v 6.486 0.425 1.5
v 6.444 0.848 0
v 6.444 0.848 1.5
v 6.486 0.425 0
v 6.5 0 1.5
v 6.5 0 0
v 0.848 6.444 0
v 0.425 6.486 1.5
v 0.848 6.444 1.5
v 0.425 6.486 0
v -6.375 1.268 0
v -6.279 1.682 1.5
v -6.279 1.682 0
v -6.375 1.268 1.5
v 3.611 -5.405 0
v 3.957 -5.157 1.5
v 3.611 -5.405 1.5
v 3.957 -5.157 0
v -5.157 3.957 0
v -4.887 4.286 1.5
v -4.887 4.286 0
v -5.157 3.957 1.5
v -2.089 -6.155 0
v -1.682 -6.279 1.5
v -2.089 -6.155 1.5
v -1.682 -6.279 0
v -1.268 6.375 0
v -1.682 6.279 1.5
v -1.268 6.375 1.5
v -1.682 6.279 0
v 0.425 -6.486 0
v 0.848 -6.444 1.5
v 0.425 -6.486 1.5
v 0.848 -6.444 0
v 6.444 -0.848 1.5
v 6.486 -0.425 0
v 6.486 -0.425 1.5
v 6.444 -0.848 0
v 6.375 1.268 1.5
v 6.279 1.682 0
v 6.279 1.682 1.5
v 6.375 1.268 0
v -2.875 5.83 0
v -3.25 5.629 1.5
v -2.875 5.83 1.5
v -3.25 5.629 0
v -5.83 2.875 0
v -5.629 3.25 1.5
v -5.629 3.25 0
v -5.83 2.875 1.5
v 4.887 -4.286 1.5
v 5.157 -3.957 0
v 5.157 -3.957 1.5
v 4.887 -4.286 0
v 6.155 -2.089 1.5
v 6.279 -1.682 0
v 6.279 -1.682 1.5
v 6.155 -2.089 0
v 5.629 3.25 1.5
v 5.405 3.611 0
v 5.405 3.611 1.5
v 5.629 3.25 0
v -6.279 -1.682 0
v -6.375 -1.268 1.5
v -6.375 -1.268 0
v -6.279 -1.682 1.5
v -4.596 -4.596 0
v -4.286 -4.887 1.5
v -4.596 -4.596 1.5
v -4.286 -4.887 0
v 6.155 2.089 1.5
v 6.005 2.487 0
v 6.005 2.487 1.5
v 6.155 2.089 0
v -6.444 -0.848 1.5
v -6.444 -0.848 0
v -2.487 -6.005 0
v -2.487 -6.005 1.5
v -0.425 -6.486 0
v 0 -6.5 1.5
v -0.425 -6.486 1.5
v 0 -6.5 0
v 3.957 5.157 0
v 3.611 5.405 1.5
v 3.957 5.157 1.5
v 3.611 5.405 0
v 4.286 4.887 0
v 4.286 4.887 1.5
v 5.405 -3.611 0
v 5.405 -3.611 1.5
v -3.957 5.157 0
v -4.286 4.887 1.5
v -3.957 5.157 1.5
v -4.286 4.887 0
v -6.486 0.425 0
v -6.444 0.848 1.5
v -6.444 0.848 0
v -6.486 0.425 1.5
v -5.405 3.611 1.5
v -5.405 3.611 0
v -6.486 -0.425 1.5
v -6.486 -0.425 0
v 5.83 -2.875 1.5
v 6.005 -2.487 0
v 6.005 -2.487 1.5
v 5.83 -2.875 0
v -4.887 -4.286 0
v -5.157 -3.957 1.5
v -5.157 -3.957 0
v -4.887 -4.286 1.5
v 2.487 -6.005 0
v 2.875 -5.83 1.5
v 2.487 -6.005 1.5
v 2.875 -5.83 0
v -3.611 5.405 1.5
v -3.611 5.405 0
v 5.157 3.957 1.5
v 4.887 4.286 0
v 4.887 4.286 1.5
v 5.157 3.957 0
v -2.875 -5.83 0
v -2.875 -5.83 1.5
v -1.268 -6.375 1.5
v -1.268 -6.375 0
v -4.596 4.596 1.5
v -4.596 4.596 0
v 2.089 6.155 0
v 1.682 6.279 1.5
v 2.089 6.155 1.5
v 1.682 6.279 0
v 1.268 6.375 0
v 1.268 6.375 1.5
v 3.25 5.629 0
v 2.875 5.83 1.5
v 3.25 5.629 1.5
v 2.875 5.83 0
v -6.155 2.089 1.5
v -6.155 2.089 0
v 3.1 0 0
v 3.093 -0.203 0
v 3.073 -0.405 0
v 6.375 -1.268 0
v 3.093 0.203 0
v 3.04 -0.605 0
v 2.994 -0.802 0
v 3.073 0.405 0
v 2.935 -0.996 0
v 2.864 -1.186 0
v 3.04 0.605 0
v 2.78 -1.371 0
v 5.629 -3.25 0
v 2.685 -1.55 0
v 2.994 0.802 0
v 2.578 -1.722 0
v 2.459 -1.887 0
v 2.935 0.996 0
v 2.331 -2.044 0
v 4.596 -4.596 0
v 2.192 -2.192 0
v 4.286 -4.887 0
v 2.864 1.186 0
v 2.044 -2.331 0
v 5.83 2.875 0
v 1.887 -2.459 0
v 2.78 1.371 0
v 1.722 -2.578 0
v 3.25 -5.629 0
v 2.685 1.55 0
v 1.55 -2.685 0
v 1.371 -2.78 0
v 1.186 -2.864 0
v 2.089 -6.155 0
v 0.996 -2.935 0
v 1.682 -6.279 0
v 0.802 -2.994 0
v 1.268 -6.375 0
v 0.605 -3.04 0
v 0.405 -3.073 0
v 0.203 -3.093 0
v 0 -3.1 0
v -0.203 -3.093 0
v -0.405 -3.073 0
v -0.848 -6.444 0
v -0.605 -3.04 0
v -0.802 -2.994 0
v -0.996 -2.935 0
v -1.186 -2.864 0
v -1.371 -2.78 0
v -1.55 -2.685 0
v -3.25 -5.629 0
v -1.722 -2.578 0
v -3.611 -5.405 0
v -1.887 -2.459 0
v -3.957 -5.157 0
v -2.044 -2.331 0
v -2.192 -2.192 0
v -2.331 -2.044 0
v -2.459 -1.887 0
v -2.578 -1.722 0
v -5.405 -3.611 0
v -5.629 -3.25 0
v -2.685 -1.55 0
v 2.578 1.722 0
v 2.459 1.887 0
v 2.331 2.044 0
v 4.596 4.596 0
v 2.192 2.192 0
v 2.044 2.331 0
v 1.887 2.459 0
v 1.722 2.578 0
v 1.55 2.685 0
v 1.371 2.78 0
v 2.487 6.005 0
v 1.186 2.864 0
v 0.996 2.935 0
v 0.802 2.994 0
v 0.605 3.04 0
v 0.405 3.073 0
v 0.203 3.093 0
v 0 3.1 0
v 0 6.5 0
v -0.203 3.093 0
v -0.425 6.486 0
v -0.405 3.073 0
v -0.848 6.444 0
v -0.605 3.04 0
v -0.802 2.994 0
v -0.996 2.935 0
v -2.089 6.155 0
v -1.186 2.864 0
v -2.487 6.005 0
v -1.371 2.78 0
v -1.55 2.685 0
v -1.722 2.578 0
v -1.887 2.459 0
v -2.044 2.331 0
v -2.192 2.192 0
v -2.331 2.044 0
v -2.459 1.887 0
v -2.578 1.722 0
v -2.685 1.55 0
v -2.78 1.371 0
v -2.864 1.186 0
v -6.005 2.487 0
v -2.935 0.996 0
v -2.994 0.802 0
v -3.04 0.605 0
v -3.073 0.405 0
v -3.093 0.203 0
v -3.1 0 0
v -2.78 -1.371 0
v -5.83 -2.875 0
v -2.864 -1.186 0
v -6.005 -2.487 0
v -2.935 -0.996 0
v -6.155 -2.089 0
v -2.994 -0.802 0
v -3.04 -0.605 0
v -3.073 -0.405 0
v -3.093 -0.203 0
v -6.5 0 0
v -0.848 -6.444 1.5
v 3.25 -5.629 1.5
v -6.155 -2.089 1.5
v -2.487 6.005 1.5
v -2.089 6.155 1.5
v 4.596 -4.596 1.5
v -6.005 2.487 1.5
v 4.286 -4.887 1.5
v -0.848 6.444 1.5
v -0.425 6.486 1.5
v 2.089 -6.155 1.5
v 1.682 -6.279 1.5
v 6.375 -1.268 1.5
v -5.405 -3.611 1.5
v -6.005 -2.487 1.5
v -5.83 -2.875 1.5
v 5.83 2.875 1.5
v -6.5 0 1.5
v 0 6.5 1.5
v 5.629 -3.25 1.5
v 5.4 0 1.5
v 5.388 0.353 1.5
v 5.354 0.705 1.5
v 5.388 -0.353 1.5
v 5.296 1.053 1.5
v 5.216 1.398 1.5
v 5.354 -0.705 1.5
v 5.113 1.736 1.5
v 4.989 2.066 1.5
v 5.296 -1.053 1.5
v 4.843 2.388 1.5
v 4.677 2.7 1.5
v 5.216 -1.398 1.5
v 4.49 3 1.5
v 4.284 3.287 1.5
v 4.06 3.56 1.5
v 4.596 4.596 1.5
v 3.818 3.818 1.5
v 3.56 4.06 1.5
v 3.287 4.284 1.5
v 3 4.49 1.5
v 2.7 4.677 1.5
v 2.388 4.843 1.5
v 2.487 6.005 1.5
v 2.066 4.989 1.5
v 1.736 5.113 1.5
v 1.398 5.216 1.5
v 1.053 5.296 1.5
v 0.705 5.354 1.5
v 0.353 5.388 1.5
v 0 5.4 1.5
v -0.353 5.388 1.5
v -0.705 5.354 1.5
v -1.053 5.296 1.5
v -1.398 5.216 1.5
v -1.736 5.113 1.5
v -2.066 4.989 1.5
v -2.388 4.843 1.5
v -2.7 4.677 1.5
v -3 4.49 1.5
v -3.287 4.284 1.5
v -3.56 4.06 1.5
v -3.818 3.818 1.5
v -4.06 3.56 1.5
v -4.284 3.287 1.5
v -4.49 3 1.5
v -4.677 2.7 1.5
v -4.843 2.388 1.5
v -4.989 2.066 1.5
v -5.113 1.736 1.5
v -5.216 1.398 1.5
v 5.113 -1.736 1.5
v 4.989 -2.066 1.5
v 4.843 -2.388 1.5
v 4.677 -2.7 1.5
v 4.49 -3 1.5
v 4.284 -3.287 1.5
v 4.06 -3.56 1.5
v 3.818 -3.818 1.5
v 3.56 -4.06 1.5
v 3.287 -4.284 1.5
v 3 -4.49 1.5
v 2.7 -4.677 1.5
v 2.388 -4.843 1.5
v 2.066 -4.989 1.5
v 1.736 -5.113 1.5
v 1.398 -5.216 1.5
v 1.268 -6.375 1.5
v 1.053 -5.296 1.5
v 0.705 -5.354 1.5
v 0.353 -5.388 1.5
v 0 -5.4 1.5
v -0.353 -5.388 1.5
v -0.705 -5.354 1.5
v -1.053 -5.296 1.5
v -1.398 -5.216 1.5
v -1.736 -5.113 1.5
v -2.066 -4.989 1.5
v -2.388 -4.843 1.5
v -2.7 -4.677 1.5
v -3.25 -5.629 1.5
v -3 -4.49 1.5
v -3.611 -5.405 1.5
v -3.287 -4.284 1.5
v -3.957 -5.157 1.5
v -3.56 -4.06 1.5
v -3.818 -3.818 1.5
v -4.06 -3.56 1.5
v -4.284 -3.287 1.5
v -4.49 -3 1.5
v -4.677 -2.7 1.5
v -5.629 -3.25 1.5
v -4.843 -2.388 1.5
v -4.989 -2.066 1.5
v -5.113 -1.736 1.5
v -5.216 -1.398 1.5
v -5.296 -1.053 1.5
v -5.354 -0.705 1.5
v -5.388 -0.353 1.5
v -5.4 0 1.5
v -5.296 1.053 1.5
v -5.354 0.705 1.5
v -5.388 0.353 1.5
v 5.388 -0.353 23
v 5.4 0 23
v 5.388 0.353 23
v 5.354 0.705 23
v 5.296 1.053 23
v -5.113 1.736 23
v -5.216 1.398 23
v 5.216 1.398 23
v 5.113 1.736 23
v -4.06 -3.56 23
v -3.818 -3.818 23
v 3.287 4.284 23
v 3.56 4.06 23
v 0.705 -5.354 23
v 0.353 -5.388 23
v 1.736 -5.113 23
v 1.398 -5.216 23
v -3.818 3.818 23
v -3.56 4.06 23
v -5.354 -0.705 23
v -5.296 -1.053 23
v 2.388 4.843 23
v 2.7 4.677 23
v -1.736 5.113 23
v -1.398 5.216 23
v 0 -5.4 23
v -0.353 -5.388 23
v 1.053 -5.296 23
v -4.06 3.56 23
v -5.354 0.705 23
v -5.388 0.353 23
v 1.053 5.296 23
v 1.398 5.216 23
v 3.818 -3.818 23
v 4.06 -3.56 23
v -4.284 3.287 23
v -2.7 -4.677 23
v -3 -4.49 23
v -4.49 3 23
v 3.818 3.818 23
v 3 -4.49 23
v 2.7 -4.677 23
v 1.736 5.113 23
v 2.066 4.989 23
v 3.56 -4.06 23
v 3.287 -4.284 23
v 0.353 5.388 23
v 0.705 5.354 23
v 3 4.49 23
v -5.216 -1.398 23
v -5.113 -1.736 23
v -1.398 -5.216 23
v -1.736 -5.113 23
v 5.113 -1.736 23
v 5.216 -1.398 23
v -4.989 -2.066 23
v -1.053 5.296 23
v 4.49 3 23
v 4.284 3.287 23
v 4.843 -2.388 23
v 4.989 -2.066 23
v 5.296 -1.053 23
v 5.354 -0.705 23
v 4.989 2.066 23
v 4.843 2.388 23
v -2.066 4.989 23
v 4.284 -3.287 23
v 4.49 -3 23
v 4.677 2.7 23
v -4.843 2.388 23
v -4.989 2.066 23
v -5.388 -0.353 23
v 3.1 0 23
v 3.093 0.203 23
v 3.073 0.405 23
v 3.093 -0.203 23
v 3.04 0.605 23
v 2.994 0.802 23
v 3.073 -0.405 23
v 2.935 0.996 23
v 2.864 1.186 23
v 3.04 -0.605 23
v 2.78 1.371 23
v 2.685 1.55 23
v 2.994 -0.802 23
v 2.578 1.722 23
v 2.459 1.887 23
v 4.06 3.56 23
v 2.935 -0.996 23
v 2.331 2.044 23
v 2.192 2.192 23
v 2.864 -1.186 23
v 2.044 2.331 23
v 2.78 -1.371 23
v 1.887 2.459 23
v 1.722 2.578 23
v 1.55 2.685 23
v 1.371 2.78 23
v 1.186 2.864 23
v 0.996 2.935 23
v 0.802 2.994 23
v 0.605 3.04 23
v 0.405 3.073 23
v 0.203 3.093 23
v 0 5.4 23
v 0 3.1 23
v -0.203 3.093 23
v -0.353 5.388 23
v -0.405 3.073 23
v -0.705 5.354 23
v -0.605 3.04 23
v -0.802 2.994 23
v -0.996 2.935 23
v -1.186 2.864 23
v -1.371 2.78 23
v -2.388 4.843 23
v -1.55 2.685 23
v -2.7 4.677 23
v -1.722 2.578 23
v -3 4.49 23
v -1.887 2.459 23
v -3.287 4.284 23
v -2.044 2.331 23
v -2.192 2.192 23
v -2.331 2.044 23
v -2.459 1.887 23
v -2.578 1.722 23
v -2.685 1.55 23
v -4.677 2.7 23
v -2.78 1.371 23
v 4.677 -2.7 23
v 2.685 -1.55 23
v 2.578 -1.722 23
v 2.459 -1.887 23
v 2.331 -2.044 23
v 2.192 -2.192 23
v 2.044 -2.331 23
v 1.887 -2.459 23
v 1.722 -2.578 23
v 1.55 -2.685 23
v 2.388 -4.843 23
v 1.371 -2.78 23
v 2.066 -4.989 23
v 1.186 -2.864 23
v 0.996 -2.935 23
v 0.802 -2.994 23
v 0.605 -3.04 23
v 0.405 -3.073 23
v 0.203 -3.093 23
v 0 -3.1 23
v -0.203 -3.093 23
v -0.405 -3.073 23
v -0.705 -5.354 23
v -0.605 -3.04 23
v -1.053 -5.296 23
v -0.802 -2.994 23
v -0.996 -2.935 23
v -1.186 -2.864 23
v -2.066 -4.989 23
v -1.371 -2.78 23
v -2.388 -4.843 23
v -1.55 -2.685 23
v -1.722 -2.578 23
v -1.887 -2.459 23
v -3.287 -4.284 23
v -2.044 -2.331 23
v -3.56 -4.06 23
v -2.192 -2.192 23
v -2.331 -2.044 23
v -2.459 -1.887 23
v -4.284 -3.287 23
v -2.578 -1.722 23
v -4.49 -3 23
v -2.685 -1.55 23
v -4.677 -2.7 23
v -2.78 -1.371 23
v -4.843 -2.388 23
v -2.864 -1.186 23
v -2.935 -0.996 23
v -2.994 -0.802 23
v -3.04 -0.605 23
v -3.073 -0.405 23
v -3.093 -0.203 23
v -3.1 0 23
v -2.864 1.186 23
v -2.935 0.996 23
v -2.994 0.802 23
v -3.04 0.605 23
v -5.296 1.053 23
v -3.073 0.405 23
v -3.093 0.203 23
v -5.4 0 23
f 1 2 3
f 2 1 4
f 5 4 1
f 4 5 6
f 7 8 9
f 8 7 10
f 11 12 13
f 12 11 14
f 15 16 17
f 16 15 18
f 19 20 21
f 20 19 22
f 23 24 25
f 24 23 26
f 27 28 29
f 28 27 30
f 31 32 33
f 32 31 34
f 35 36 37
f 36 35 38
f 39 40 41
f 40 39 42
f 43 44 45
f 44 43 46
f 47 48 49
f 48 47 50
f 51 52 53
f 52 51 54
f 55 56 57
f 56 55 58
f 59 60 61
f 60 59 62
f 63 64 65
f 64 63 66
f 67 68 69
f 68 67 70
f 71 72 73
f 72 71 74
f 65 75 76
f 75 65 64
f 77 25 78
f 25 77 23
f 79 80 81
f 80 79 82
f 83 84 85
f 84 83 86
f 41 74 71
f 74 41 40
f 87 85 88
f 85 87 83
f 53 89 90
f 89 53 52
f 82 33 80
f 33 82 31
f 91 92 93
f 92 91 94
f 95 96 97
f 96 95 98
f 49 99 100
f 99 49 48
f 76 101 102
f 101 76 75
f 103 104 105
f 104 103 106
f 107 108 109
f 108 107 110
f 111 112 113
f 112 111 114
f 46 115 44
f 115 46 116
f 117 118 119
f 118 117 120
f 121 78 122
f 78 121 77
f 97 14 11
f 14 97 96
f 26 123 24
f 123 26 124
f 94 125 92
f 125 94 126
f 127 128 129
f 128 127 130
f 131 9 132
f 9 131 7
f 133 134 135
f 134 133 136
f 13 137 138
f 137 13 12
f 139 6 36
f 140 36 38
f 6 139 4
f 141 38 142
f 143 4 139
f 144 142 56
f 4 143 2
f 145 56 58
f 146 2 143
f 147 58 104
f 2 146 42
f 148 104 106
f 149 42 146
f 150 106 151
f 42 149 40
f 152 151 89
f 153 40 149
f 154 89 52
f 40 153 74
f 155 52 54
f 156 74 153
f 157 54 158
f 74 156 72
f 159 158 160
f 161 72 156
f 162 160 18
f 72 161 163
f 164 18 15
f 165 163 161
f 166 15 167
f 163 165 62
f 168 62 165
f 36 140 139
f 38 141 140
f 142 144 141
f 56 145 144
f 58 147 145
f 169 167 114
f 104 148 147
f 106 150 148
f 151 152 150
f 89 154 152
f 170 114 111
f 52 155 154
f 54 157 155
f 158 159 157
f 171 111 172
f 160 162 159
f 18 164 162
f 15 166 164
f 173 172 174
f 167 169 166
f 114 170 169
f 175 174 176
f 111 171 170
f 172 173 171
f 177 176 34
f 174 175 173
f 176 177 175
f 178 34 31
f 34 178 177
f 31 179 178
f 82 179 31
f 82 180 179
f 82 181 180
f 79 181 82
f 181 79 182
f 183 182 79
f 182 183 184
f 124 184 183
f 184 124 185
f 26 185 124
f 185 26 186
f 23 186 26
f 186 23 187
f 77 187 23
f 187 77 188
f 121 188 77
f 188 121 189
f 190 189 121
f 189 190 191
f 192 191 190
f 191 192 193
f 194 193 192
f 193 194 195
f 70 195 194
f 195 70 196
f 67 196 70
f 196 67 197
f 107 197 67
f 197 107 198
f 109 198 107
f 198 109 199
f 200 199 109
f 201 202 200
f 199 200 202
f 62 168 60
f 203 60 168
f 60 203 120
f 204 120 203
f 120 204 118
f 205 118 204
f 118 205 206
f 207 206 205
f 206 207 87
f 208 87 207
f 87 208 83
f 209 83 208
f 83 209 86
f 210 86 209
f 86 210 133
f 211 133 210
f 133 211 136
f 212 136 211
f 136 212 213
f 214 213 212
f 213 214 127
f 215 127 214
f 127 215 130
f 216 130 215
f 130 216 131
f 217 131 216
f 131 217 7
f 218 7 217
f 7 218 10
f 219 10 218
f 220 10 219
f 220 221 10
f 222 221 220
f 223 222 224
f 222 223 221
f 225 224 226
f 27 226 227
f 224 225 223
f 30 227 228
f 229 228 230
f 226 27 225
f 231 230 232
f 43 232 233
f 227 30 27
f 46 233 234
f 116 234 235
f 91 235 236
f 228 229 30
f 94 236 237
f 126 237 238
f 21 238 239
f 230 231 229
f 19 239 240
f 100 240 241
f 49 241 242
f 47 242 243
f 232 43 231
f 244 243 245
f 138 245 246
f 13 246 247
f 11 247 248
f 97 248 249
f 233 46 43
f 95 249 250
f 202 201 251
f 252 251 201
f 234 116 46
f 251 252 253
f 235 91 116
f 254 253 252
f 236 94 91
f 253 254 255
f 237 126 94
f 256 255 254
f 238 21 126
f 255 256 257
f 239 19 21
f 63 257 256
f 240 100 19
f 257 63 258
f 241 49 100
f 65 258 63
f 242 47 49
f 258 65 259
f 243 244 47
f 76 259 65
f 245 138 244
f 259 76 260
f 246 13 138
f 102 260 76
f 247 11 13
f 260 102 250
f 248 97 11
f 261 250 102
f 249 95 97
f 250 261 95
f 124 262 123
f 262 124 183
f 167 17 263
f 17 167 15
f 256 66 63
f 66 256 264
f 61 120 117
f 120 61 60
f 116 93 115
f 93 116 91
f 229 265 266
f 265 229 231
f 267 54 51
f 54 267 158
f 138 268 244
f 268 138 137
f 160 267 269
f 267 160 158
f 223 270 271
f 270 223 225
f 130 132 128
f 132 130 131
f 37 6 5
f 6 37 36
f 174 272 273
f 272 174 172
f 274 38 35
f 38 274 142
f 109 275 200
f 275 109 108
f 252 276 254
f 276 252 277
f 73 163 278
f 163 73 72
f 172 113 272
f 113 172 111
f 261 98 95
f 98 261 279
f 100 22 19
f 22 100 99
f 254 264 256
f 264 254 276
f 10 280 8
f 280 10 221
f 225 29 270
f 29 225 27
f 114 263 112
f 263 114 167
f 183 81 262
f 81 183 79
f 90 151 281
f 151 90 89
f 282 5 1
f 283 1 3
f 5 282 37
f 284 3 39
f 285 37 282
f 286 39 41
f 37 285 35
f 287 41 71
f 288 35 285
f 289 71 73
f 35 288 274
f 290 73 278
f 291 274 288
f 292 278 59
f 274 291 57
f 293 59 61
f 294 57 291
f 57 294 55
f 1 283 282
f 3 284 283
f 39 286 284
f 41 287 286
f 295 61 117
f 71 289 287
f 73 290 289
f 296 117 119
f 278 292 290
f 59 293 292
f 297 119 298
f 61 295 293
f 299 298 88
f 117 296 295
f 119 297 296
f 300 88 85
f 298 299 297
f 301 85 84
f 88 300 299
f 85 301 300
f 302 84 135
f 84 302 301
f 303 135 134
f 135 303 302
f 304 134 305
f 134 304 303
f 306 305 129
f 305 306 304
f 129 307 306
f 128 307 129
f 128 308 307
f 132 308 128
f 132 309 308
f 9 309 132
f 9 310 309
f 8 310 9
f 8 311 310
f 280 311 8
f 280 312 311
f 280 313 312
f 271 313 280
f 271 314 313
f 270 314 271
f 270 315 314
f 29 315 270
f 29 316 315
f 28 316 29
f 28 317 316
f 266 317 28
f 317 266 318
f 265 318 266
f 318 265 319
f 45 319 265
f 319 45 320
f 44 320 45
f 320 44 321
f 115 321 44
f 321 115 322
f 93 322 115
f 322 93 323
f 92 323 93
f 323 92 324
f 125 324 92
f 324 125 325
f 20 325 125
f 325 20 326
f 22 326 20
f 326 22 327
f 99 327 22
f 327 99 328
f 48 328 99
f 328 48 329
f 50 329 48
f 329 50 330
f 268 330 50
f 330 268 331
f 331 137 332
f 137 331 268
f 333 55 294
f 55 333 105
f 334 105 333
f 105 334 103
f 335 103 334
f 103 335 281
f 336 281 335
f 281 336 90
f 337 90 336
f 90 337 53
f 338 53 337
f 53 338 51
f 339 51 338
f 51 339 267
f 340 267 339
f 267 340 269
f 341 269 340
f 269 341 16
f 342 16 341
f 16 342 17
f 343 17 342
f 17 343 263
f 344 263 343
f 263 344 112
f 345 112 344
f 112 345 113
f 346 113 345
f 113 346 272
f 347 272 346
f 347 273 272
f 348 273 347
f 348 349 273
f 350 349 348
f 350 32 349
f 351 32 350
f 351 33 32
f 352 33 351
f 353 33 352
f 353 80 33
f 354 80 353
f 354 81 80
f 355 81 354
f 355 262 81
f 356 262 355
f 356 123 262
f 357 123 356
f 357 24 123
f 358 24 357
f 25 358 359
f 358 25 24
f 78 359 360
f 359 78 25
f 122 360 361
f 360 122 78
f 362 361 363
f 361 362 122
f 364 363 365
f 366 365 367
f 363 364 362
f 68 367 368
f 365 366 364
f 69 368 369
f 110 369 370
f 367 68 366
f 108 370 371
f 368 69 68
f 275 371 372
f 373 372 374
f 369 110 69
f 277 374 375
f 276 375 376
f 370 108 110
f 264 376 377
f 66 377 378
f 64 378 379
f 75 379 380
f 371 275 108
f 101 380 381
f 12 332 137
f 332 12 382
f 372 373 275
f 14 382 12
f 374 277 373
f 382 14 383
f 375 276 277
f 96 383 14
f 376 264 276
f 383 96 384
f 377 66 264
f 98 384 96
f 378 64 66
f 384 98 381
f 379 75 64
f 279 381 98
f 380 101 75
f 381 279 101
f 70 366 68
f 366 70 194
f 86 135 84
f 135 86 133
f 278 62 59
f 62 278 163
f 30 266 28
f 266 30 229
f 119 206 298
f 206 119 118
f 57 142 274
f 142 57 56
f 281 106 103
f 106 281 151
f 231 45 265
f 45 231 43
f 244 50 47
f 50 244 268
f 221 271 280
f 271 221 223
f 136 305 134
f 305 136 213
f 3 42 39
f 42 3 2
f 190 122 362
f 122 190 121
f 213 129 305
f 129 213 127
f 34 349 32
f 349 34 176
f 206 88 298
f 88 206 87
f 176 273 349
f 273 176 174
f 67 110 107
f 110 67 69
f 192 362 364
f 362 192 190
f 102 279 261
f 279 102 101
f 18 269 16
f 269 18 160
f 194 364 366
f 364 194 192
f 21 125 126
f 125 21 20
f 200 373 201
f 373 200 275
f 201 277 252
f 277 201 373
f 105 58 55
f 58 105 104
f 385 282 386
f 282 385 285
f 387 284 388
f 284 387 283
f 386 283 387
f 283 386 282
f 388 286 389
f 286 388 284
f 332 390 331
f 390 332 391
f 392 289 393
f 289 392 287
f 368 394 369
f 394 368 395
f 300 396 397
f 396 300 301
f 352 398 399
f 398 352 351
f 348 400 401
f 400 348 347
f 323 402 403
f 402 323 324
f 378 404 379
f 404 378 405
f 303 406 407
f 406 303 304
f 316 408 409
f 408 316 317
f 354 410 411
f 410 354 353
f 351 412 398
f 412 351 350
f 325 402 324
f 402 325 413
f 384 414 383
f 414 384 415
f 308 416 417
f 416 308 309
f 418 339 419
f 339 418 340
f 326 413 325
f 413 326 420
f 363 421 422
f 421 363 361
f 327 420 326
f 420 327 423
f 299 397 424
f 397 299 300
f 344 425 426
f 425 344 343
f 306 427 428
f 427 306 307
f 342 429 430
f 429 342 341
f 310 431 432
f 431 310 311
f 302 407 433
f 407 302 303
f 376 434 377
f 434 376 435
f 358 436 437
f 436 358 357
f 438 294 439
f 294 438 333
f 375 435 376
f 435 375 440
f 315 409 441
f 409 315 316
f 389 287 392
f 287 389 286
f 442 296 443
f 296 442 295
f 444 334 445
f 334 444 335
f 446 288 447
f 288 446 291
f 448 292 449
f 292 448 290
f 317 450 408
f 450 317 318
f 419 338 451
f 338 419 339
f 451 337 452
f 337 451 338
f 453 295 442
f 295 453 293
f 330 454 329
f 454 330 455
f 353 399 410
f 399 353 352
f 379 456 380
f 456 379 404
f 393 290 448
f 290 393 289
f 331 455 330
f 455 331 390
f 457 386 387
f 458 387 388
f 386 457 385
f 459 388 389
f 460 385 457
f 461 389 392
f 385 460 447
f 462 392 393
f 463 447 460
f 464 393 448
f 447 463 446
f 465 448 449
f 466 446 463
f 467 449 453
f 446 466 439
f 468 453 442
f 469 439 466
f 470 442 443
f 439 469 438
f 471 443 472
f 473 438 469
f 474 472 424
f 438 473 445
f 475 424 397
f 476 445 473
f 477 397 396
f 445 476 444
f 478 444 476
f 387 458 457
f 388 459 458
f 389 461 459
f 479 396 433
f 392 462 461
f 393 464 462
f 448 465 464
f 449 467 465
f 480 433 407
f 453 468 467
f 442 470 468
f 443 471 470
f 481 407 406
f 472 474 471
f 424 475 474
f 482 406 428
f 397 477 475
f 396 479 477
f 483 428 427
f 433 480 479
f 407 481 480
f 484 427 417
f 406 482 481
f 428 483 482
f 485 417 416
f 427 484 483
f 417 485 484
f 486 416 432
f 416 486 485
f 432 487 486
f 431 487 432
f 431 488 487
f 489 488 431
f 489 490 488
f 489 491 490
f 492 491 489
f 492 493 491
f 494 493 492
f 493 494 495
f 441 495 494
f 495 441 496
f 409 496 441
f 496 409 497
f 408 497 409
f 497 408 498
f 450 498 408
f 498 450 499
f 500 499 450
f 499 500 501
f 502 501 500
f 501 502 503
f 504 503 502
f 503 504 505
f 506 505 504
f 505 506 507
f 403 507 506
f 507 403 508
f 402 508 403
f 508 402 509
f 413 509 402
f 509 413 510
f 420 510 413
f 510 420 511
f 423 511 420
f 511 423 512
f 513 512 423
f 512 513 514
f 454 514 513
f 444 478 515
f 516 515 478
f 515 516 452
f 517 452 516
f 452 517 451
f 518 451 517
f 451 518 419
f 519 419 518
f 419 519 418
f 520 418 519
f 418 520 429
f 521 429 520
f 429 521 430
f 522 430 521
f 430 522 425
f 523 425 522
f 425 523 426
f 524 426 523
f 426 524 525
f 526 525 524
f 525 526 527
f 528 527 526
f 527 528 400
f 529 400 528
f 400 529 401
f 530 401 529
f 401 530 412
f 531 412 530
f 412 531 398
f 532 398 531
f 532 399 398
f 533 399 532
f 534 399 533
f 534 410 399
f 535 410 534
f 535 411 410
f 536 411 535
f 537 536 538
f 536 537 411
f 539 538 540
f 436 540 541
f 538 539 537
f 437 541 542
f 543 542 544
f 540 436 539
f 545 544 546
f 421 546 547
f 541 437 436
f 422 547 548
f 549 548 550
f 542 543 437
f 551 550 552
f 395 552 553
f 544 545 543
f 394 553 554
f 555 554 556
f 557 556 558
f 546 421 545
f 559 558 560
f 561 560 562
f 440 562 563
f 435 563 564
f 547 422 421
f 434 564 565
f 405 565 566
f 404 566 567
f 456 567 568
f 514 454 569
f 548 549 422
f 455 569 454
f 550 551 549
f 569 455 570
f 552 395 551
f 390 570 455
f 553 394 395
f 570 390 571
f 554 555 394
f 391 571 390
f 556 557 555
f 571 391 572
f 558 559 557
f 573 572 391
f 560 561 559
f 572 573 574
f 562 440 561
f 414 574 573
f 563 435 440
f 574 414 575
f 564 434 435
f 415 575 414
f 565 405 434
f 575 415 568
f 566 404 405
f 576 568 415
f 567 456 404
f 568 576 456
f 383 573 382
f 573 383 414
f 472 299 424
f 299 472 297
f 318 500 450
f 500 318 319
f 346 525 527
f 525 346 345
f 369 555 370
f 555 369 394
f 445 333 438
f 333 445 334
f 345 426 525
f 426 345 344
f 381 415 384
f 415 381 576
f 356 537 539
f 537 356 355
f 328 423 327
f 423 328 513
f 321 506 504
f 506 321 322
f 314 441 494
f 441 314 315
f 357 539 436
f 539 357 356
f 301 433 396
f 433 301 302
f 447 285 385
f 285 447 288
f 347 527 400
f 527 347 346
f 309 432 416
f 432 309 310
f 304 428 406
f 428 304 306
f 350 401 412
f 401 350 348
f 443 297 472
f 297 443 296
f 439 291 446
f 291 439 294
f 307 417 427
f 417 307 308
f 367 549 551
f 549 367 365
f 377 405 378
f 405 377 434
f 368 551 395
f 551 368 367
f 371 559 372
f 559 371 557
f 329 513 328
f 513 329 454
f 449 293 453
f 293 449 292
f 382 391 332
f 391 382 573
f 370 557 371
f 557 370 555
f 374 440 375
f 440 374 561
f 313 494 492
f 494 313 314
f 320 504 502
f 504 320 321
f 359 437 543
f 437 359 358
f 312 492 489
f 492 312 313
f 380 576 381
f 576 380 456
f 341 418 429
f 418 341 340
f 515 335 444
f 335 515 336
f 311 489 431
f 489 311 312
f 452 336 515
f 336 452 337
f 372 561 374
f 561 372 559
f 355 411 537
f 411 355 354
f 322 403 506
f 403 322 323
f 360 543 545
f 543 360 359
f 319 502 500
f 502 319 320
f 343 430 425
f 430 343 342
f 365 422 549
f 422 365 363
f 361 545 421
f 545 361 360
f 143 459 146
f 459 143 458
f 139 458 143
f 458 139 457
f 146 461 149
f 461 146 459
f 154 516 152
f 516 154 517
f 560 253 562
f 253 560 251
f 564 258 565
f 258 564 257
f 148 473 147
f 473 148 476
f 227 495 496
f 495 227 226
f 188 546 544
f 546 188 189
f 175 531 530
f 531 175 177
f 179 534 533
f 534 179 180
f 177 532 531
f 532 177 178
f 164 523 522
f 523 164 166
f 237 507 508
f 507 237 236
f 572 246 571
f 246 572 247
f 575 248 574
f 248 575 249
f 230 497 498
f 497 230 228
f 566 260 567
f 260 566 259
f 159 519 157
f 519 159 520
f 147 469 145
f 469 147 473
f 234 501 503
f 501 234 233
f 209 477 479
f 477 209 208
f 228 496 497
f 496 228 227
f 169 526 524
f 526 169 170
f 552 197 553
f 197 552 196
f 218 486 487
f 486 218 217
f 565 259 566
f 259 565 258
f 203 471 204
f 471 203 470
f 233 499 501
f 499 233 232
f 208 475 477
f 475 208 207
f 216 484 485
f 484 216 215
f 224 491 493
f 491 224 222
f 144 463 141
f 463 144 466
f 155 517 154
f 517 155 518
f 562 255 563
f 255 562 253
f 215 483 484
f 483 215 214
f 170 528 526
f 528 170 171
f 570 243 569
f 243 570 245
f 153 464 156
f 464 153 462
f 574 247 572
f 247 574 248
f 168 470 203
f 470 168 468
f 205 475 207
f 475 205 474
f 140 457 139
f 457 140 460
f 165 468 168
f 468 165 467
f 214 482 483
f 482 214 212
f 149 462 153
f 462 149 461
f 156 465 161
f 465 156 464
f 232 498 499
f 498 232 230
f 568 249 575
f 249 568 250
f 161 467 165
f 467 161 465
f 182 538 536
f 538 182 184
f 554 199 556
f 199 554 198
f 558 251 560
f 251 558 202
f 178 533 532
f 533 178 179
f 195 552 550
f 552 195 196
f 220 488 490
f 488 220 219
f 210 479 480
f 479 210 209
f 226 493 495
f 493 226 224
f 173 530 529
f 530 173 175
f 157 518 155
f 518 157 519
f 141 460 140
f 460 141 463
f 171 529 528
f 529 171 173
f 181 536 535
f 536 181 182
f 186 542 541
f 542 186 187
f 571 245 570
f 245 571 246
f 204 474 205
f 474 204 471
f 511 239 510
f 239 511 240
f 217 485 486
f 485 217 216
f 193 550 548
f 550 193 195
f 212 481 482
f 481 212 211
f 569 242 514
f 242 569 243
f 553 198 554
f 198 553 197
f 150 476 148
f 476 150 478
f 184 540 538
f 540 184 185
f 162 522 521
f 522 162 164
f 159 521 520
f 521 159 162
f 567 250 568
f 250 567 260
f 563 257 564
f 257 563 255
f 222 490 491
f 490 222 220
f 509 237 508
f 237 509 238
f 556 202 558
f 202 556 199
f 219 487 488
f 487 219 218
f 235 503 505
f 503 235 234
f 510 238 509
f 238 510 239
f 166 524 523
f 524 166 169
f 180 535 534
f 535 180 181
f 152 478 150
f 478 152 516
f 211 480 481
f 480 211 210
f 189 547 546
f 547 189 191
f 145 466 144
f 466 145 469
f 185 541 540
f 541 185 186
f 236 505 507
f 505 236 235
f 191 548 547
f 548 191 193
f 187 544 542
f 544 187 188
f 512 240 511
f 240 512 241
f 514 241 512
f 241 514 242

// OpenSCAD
// PCR Tube Adapter Sleeve - fits a 0.2 mL tube into a 1.5 mL rack hole.
// Print orientation: Collar on bed (z=0 to 1.5), body rises to z=21.5.

// Dimensions
collar_od   = 13;      // Outer diameter of the collar
collar_t    = 1.5;     // Thickness of the collar
body_od     = 10.8;    // Outer diameter of the sleeve body
body_total  = 21.5;    // Total height of the body section (from top of collar)
bore_d      = 6.2;     // Diameter of the straight bore

// Derived dimensions
collar_z_top = collar_t;
body_z_top   = body_total + collar_z_top;

// Ensure smooth rendering for curved surfaces
$fn = 96;

difference() {
    union() {
        // 1. The Collar (lies on the bed)
        translate([0, 0, 0]) 
            cylinder(h = collar_t, d = collar_od);

        // 2. The Sleeve Body (rises from the collar)
        translate([0, 0, collar_z_top]) 
            cylinder(h = body_total, d = body_od);
    }
    
    // 3. The Bore (straight hole through the full height)
    // Extends slightly past the top and bottom to ensure clean cutting
    translate([0, 0, -1]) 
        cylinder(h = body_z_top + 2, d = bore_d);
}
